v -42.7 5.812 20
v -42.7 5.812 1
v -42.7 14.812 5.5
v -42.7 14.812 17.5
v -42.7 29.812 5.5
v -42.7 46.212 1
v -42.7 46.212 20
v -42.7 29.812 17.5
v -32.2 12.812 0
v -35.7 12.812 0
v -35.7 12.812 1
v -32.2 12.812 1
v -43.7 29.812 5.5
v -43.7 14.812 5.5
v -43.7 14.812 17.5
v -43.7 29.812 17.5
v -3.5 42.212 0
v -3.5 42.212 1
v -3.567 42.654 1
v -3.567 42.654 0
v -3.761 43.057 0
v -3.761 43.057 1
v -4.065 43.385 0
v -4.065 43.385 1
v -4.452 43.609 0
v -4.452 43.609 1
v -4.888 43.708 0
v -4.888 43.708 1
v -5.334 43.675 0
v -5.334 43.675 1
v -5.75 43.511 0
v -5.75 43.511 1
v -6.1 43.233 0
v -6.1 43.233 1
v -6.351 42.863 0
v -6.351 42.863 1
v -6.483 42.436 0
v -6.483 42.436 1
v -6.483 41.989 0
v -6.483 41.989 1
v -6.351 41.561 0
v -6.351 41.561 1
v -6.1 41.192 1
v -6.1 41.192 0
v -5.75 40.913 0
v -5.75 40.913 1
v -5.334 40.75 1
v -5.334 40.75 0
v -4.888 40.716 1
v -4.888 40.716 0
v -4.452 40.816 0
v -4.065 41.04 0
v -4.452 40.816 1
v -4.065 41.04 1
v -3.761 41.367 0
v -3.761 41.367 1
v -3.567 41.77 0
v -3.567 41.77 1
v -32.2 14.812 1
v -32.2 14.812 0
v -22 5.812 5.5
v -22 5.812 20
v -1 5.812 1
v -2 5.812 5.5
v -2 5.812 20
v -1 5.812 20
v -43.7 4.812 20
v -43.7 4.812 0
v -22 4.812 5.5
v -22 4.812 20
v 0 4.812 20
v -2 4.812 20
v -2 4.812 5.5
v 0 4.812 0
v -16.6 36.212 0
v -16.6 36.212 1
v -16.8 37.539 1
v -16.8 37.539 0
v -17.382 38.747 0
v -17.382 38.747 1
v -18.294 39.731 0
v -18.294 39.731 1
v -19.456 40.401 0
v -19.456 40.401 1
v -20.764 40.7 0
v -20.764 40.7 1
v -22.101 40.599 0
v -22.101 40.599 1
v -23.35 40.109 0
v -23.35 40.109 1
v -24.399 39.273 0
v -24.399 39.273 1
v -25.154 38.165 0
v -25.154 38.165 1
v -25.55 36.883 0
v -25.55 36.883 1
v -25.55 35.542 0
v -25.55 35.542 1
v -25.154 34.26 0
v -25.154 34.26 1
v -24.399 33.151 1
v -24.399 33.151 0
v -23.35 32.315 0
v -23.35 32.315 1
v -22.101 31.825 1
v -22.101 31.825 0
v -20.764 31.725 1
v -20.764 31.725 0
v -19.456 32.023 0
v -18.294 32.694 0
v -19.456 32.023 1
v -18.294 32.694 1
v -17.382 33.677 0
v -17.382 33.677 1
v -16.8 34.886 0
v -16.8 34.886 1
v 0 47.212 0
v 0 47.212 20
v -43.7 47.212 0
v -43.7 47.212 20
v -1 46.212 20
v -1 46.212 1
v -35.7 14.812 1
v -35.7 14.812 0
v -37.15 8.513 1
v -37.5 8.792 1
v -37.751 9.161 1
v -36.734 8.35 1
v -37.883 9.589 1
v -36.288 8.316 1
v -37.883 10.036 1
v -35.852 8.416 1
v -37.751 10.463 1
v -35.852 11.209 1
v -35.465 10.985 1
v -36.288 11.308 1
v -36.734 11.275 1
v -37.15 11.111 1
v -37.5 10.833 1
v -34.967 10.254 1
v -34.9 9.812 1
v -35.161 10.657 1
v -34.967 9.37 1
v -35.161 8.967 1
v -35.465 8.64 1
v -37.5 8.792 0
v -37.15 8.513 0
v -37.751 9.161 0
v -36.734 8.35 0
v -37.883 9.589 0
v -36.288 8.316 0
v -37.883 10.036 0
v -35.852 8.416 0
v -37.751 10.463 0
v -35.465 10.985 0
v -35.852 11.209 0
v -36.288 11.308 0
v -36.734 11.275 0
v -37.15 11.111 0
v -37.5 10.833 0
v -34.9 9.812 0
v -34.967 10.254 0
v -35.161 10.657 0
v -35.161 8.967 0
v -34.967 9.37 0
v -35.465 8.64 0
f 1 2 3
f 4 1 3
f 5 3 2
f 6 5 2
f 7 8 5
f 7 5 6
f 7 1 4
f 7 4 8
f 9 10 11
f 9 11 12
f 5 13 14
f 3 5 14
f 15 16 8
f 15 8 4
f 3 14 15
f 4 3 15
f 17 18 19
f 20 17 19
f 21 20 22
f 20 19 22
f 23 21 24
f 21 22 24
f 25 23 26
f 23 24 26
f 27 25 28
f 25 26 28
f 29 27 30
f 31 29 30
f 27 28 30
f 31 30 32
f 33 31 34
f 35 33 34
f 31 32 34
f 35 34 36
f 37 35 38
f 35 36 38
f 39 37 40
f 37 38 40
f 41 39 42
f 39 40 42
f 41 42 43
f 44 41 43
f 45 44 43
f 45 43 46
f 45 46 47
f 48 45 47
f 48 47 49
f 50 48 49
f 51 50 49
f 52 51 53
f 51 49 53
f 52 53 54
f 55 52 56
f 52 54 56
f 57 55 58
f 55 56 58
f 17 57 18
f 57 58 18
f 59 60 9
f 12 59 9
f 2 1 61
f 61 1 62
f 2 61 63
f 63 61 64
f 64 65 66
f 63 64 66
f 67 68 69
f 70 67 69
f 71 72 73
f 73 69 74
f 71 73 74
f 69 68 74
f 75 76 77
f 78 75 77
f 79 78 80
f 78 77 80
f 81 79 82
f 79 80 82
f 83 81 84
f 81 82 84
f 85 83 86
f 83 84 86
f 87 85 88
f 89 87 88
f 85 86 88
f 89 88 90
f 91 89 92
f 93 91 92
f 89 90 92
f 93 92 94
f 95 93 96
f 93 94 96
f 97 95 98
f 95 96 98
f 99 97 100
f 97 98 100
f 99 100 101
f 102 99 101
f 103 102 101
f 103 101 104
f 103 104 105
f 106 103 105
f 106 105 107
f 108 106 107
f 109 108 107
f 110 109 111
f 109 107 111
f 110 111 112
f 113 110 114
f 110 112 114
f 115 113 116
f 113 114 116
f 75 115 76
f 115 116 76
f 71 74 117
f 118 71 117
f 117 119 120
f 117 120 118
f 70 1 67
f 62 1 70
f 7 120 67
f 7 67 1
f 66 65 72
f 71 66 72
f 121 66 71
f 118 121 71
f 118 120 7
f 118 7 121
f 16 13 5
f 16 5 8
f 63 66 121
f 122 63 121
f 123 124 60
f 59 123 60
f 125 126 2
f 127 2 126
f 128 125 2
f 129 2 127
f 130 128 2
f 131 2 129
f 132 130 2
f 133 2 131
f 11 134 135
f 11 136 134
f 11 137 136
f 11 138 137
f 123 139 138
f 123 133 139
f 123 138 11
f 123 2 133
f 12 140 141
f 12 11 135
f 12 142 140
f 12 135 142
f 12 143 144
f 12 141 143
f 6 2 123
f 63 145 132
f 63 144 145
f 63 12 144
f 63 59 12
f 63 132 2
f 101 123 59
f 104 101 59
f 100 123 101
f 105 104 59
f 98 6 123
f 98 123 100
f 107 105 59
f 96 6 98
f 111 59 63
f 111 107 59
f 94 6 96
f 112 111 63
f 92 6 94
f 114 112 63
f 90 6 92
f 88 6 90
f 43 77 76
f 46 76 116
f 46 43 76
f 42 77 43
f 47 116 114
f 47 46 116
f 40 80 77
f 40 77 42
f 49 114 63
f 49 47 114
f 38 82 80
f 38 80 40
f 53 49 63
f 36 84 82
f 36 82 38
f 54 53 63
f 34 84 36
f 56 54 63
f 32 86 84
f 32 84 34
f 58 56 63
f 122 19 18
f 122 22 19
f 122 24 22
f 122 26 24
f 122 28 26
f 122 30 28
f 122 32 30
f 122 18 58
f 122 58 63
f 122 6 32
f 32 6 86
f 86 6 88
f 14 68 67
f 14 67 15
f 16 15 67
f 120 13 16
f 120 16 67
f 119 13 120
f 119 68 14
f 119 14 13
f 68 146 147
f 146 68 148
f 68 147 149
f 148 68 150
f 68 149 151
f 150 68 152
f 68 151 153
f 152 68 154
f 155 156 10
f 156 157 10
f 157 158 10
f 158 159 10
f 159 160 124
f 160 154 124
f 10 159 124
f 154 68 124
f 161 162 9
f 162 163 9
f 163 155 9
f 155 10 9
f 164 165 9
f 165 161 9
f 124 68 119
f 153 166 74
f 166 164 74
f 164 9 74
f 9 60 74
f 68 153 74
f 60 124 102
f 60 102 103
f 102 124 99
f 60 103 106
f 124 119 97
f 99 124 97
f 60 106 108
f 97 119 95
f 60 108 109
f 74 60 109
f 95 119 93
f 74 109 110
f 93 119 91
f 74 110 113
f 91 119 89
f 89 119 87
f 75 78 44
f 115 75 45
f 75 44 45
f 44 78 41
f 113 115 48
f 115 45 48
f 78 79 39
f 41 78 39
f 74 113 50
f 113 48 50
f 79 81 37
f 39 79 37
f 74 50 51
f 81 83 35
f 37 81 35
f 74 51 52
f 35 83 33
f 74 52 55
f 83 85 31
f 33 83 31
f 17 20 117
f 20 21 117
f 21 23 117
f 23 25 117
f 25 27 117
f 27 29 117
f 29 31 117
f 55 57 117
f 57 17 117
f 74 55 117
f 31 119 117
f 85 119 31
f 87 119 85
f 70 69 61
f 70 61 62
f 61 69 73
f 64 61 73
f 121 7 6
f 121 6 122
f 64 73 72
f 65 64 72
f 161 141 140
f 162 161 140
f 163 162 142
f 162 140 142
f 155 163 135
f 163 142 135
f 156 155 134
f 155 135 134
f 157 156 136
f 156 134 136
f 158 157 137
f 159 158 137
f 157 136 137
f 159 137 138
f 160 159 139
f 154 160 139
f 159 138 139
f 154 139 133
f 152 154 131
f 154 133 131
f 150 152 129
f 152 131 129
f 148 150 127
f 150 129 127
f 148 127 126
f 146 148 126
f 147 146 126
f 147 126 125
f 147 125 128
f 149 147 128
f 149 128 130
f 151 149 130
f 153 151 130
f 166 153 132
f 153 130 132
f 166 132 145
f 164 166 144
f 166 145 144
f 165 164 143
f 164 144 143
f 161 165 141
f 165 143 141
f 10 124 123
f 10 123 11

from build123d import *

# Parameters (mm, degrees)
F0_W      = 43.7
F0_H      = 42.4
F1_DEPTH  = 20
F2_W      = 41.7
F2_H      = 40.4
F3_DEPTH  = 19
F4_R      = 1.5
F5_DEPTH  = 1
F6_R      = 4.5
F7_DEPTH  = 1
F8_W      = 15
F8_H      = 12
F9_DEPTH  = 1
F10_W     = 20
F10_H     = 14.5
F11_DEPTH = 1
F12_W     = 3.5
F12_H     = 2
F13_DEPTH = 1


with BuildPart() as f1:
    # F0 (on Top) → F1 (new body)
    with BuildSketch(Plane.XY):
        with Locations((-21.85, 26.01227)):
            Rectangle(F0_W, F0_H)
    extrude(amount=F1_DEPTH)

    # F2 (on face) → F3 (cut)
    with BuildSketch(Plane.XY.offset(20)):
        with Locations((-21.85, 26.01227)):
            Rectangle(F2_W, F2_H)
    extrude(amount=-F3_DEPTH, mode=Mode.SUBTRACT)

    # F4 (on face) → F5 (cut)
    with BuildSketch(Plane.XY.offset(1)):
        with Locations((-5, 42.21227)):
            Circle(F4_R)
        with Locations((-36.4, 9.81227)):
            Circle(F4_R)
    extrude(amount=-F5_DEPTH, mode=Mode.SUBTRACT)

    # F6 (on face) → F7 (cut)
    with BuildSketch(Plane.XY.offset(1)):
        with Locations((-21.1, 36.21227)):
            Circle(F6_R)
    extrude(amount=-F7_DEPTH, mode=Mode.SUBTRACT)

    # F8 (on face) → F9 (cut)
    with BuildSketch(Plane(origin=(-43.7, 0, 0), x_dir=(0, -1, 0), z_dir=(-1, 0, 0))):
        with Locations((-22.31227, 11.5)):
            Rectangle(F8_W, F8_H)
    extrude(amount=-F9_DEPTH, mode=Mode.SUBTRACT)

    # F10 (on face) → F11 (cut)
    with BuildSketch(Plane.XZ.offset(-4.81227)):
        with Locations((-12, 12.75)):
            Rectangle(F10_W, F10_H)
    extrude(amount=-F11_DEPTH, mode=Mode.SUBTRACT)

    # F12 (on face) → F13 (cut)
    with BuildSketch(Plane(origin=(0, 0, 0), x_dir=(1, 0, 0), z_dir=(0, 0, -1))):
        with Locations((-33.95, -13.81227)):
            Rectangle(F12_W, F12_H)
    extrude(amount=-F13_DEPTH, mode=Mode.SUBTRACT)


solid = f1.part
